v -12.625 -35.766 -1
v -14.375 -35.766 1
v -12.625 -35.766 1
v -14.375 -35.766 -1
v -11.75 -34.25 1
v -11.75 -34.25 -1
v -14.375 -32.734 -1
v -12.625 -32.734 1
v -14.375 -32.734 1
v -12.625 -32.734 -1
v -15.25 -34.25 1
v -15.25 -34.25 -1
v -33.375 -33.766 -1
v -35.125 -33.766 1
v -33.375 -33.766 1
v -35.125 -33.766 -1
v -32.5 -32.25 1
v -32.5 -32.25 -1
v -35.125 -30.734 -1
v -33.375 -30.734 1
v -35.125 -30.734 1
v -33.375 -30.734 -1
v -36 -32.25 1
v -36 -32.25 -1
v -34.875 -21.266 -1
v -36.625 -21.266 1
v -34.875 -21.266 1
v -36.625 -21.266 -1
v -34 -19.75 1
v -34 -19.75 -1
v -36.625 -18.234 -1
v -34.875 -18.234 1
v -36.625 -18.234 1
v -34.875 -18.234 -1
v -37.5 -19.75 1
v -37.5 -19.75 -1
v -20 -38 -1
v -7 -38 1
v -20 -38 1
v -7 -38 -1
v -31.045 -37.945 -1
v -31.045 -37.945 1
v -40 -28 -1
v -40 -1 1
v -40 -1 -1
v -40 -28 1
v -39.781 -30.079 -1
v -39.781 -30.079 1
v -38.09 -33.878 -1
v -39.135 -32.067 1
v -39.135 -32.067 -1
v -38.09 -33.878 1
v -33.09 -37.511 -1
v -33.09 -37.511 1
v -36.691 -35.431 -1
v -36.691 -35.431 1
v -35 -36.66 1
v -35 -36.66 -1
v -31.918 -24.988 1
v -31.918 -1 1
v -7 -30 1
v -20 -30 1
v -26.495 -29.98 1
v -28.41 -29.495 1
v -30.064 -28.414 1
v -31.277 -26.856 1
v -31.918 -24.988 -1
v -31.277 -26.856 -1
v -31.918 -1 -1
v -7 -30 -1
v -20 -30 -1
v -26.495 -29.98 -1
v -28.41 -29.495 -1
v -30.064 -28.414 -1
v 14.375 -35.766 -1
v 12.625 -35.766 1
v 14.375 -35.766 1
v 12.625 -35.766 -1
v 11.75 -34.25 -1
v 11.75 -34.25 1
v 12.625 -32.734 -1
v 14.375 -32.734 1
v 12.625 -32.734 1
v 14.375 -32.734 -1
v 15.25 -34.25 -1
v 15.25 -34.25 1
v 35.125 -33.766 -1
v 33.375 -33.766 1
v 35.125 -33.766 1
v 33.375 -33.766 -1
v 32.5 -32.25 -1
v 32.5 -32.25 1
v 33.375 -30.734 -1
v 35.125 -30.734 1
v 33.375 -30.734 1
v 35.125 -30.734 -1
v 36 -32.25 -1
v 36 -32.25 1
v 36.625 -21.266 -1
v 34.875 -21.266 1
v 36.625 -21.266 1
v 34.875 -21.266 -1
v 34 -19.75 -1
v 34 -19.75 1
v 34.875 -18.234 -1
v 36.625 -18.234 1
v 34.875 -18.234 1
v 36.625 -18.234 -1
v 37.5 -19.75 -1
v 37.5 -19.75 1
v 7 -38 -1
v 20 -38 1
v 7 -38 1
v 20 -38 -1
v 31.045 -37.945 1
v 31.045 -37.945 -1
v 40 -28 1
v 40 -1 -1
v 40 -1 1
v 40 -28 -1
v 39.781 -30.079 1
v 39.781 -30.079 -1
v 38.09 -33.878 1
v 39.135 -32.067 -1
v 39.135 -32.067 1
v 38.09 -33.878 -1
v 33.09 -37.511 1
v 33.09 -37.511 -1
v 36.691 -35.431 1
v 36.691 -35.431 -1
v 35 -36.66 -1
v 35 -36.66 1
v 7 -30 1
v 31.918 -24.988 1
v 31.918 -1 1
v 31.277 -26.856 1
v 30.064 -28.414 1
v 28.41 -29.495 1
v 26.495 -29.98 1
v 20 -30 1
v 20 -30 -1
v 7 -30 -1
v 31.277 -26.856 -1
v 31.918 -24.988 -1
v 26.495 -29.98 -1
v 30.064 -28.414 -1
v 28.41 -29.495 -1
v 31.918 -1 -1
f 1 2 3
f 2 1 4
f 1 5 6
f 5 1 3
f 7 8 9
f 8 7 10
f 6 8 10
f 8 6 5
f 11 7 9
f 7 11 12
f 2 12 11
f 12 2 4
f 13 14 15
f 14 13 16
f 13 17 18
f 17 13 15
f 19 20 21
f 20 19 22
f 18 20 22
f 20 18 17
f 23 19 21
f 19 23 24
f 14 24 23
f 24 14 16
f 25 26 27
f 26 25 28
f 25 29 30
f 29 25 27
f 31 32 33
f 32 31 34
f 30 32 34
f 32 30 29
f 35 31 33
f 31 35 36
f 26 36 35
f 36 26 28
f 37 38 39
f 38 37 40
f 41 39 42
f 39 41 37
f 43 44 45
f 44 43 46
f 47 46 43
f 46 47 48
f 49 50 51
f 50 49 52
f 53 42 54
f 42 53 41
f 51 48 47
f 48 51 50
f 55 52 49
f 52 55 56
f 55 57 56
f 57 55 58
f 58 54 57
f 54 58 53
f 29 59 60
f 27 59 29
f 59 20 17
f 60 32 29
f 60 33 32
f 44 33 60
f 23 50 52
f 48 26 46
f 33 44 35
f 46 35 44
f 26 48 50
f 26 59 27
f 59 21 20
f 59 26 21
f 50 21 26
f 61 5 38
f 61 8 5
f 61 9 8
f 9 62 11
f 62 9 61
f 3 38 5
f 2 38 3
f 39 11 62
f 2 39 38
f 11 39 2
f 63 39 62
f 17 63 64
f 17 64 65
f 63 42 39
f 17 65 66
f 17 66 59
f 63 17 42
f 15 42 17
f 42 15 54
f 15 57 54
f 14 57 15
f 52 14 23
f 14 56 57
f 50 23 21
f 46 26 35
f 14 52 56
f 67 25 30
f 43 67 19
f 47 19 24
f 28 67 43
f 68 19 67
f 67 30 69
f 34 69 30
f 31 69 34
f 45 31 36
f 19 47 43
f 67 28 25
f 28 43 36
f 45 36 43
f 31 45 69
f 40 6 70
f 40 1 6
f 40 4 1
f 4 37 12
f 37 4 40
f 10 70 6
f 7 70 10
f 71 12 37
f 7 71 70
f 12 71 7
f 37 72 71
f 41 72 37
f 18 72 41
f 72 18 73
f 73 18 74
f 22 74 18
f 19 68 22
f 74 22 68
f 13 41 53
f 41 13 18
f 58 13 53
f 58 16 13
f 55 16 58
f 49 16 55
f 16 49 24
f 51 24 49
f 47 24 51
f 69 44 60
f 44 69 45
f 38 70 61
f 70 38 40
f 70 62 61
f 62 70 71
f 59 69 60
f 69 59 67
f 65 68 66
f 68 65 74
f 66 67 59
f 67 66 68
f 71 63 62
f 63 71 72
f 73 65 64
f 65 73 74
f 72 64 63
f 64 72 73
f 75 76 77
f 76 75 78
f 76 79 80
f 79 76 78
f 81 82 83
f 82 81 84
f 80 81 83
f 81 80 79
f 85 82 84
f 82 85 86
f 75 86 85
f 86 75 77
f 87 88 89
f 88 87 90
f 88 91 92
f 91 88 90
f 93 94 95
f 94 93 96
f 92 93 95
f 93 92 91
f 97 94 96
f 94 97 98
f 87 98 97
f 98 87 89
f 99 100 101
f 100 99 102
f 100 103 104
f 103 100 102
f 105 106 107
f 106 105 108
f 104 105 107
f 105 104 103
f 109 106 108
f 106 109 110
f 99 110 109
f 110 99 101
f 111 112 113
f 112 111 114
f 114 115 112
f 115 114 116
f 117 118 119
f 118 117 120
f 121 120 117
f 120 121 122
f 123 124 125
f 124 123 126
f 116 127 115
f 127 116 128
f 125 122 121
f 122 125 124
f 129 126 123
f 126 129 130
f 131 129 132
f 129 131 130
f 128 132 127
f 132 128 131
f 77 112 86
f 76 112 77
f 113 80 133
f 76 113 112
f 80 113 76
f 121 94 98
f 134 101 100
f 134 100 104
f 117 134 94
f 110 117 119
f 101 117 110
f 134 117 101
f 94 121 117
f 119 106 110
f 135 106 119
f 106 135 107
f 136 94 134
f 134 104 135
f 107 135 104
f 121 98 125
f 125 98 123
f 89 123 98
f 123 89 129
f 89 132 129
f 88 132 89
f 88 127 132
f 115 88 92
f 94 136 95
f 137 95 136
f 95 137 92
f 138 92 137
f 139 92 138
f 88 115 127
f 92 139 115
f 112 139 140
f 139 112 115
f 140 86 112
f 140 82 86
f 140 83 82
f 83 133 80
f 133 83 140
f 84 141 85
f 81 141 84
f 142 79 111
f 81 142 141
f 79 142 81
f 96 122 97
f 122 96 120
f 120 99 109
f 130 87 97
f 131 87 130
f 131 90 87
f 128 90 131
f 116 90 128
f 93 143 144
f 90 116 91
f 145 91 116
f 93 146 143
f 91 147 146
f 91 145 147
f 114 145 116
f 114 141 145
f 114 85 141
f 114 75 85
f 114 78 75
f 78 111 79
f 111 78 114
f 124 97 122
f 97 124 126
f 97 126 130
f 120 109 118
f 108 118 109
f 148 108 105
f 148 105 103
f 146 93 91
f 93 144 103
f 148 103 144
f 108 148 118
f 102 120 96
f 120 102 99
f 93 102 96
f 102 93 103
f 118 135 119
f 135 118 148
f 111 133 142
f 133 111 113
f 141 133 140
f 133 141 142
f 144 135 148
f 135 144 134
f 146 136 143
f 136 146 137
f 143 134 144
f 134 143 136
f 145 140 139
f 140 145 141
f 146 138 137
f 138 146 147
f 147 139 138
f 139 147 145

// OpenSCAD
//servoArm(false);
//    basePlate(length=44,width=76, height=2, radius=10);
    
//    translate([0,0,2]){
//        mirror([0,1,0]){
//            basePlate(length=44,width=76, height=2, radius=10);
//        }
//    }

plates(44,76, 2, 10);

    
    module servoArm(dif = false)
    {
            holeStart = 33;
            translate([0,0,4]){
                difference(){
                    union(){
                        cylinder(d=10, h=8, center=true);
                        difference(){
                            translate([0,0,-2.85]){
                                hull(){
                                    cylinder(d=14, h=2.3, center=true);
                                    translate([30,0,0]){
                                        cylinder(d=9, h=2.3, center=true);
                                    }
                                }
                            }
                            
                            for (i = [1:6]){
                                translate([holeStart  - 3*i,0,0]){ cylinder(d=1.5, h=10, center=true); }
                            }
                            
                        }

                    }
                    cylinder(d=5, h=10, center=true);
                    translate([0,0,4]){
                        cylinder(d=6, h=5, center=true);
                    }
                    translate([0,0,-2]){
                        cylinder(d=6, h=5, center=true);
                    }
                }
            }
            
            if (dif) {
                for (i = [1:6]){
                    translate([holeStart  - 3*i,0,0]){ cylinder(d=1.6, h=16, center=true); }
                }
                    cylinder(d=4, h=20, center=true);
                    translate([0,0,5.5]){
                        cylinder(d=7, h=5, center=true);
                    }
                    translate([0,0,2.5]){
                        cylinder(d=7, h=5, center=true);
                    }
            }
            
    }
    
    module basePlate(length=10, width=10, height=10, radius=2, holes = true)
    {
        translate([length/4-1,0,0]){
            difference(){
                hull(){
            
                    cube([length - 2*radius, width, height], center=true);
                    translate([-length/2, width/2-radius, 0]){
                        cylinder(d=2*radius, h=height, center=true);
                    }
                    translate([-length/2, -(width/2-radius), 0]){
                        cylinder(d=2*radius, h=height, center=true);
                    }
                }
                if (holes){
                    translate([-length/8, (width/2-3)-.75, 0]){ cylinder(d=3.5, h=10, center=true); }
                    translate([-length/8, -(width/2-3 - .75), 0]){ cylinder(d=3.5, h=10, center=true); }

                    translate([-(length+radius)/2 + .75, width/2-(radius/2)-.75, 0]){ cylinder(d=3.5, h=10, center=true); }
                    translate([-(length+radius)/2 + .75, -(width/2-(radius/2)-.75), 0]){ cylinder(d=3.5, h=10, center=true); }

                    translate([-(length+radius)/2-.75, width/4+.75, 0]){ cylinder(d=3.5, h=10, center=true); }
                    translate([-(length+radius)/2-.75, -(width/4+.75), 0]){ cylinder(d=3.5, h=10, center=true); }


//                    translate([-(length+radius)/2-.75, width/4+.75, 0]){ cylinder(d=3.5, h=10, center=true); }
//                    translate([-length/2-6.5, -width/4-.75, 0]){ cylinder(d=3.5, h=10, center=true); }
                }
            }
        }
    }
    
    
module legBase(length, width, thick)
{
    translate([0,0,thick/2]){
            hull(){
                cylinder(d=width, h=thick, center=true);
                translate([length-width, 0,0]){
                    cylinder(d=width, h=thick, center=true);
                }
            }
        }
}
    
    module plates(l, w, h, r = 10, d=18){
        singlePlate(l, w, h, r, d);

        mirror([1,0,0]){
            singlePlate(l, w, h, r, d);
        }
    }
    
    module singlePlate(l, w, h, r = 10, d=18){
        translate([-d,0,0]){ 
            union(){
                difference(){
                    basePlate(l,w,h,r); 
                    translate([0,w/2,0]){
                        cube([l+2,w+2,h+2], center=true); 
                    }
                    color([0,0,1]){
                        translate([l/2,0,0]){
                            cube([l/2,w+2,h+2], center=true); 
                        }
                    }

                    color([0,0,1]){
                        translate([0,2,0]){
                            basePlate(l-16,w-12,h+2,r-4, false); 
                        }
                    }
                }
                
            }            
        }
        
    }
    
